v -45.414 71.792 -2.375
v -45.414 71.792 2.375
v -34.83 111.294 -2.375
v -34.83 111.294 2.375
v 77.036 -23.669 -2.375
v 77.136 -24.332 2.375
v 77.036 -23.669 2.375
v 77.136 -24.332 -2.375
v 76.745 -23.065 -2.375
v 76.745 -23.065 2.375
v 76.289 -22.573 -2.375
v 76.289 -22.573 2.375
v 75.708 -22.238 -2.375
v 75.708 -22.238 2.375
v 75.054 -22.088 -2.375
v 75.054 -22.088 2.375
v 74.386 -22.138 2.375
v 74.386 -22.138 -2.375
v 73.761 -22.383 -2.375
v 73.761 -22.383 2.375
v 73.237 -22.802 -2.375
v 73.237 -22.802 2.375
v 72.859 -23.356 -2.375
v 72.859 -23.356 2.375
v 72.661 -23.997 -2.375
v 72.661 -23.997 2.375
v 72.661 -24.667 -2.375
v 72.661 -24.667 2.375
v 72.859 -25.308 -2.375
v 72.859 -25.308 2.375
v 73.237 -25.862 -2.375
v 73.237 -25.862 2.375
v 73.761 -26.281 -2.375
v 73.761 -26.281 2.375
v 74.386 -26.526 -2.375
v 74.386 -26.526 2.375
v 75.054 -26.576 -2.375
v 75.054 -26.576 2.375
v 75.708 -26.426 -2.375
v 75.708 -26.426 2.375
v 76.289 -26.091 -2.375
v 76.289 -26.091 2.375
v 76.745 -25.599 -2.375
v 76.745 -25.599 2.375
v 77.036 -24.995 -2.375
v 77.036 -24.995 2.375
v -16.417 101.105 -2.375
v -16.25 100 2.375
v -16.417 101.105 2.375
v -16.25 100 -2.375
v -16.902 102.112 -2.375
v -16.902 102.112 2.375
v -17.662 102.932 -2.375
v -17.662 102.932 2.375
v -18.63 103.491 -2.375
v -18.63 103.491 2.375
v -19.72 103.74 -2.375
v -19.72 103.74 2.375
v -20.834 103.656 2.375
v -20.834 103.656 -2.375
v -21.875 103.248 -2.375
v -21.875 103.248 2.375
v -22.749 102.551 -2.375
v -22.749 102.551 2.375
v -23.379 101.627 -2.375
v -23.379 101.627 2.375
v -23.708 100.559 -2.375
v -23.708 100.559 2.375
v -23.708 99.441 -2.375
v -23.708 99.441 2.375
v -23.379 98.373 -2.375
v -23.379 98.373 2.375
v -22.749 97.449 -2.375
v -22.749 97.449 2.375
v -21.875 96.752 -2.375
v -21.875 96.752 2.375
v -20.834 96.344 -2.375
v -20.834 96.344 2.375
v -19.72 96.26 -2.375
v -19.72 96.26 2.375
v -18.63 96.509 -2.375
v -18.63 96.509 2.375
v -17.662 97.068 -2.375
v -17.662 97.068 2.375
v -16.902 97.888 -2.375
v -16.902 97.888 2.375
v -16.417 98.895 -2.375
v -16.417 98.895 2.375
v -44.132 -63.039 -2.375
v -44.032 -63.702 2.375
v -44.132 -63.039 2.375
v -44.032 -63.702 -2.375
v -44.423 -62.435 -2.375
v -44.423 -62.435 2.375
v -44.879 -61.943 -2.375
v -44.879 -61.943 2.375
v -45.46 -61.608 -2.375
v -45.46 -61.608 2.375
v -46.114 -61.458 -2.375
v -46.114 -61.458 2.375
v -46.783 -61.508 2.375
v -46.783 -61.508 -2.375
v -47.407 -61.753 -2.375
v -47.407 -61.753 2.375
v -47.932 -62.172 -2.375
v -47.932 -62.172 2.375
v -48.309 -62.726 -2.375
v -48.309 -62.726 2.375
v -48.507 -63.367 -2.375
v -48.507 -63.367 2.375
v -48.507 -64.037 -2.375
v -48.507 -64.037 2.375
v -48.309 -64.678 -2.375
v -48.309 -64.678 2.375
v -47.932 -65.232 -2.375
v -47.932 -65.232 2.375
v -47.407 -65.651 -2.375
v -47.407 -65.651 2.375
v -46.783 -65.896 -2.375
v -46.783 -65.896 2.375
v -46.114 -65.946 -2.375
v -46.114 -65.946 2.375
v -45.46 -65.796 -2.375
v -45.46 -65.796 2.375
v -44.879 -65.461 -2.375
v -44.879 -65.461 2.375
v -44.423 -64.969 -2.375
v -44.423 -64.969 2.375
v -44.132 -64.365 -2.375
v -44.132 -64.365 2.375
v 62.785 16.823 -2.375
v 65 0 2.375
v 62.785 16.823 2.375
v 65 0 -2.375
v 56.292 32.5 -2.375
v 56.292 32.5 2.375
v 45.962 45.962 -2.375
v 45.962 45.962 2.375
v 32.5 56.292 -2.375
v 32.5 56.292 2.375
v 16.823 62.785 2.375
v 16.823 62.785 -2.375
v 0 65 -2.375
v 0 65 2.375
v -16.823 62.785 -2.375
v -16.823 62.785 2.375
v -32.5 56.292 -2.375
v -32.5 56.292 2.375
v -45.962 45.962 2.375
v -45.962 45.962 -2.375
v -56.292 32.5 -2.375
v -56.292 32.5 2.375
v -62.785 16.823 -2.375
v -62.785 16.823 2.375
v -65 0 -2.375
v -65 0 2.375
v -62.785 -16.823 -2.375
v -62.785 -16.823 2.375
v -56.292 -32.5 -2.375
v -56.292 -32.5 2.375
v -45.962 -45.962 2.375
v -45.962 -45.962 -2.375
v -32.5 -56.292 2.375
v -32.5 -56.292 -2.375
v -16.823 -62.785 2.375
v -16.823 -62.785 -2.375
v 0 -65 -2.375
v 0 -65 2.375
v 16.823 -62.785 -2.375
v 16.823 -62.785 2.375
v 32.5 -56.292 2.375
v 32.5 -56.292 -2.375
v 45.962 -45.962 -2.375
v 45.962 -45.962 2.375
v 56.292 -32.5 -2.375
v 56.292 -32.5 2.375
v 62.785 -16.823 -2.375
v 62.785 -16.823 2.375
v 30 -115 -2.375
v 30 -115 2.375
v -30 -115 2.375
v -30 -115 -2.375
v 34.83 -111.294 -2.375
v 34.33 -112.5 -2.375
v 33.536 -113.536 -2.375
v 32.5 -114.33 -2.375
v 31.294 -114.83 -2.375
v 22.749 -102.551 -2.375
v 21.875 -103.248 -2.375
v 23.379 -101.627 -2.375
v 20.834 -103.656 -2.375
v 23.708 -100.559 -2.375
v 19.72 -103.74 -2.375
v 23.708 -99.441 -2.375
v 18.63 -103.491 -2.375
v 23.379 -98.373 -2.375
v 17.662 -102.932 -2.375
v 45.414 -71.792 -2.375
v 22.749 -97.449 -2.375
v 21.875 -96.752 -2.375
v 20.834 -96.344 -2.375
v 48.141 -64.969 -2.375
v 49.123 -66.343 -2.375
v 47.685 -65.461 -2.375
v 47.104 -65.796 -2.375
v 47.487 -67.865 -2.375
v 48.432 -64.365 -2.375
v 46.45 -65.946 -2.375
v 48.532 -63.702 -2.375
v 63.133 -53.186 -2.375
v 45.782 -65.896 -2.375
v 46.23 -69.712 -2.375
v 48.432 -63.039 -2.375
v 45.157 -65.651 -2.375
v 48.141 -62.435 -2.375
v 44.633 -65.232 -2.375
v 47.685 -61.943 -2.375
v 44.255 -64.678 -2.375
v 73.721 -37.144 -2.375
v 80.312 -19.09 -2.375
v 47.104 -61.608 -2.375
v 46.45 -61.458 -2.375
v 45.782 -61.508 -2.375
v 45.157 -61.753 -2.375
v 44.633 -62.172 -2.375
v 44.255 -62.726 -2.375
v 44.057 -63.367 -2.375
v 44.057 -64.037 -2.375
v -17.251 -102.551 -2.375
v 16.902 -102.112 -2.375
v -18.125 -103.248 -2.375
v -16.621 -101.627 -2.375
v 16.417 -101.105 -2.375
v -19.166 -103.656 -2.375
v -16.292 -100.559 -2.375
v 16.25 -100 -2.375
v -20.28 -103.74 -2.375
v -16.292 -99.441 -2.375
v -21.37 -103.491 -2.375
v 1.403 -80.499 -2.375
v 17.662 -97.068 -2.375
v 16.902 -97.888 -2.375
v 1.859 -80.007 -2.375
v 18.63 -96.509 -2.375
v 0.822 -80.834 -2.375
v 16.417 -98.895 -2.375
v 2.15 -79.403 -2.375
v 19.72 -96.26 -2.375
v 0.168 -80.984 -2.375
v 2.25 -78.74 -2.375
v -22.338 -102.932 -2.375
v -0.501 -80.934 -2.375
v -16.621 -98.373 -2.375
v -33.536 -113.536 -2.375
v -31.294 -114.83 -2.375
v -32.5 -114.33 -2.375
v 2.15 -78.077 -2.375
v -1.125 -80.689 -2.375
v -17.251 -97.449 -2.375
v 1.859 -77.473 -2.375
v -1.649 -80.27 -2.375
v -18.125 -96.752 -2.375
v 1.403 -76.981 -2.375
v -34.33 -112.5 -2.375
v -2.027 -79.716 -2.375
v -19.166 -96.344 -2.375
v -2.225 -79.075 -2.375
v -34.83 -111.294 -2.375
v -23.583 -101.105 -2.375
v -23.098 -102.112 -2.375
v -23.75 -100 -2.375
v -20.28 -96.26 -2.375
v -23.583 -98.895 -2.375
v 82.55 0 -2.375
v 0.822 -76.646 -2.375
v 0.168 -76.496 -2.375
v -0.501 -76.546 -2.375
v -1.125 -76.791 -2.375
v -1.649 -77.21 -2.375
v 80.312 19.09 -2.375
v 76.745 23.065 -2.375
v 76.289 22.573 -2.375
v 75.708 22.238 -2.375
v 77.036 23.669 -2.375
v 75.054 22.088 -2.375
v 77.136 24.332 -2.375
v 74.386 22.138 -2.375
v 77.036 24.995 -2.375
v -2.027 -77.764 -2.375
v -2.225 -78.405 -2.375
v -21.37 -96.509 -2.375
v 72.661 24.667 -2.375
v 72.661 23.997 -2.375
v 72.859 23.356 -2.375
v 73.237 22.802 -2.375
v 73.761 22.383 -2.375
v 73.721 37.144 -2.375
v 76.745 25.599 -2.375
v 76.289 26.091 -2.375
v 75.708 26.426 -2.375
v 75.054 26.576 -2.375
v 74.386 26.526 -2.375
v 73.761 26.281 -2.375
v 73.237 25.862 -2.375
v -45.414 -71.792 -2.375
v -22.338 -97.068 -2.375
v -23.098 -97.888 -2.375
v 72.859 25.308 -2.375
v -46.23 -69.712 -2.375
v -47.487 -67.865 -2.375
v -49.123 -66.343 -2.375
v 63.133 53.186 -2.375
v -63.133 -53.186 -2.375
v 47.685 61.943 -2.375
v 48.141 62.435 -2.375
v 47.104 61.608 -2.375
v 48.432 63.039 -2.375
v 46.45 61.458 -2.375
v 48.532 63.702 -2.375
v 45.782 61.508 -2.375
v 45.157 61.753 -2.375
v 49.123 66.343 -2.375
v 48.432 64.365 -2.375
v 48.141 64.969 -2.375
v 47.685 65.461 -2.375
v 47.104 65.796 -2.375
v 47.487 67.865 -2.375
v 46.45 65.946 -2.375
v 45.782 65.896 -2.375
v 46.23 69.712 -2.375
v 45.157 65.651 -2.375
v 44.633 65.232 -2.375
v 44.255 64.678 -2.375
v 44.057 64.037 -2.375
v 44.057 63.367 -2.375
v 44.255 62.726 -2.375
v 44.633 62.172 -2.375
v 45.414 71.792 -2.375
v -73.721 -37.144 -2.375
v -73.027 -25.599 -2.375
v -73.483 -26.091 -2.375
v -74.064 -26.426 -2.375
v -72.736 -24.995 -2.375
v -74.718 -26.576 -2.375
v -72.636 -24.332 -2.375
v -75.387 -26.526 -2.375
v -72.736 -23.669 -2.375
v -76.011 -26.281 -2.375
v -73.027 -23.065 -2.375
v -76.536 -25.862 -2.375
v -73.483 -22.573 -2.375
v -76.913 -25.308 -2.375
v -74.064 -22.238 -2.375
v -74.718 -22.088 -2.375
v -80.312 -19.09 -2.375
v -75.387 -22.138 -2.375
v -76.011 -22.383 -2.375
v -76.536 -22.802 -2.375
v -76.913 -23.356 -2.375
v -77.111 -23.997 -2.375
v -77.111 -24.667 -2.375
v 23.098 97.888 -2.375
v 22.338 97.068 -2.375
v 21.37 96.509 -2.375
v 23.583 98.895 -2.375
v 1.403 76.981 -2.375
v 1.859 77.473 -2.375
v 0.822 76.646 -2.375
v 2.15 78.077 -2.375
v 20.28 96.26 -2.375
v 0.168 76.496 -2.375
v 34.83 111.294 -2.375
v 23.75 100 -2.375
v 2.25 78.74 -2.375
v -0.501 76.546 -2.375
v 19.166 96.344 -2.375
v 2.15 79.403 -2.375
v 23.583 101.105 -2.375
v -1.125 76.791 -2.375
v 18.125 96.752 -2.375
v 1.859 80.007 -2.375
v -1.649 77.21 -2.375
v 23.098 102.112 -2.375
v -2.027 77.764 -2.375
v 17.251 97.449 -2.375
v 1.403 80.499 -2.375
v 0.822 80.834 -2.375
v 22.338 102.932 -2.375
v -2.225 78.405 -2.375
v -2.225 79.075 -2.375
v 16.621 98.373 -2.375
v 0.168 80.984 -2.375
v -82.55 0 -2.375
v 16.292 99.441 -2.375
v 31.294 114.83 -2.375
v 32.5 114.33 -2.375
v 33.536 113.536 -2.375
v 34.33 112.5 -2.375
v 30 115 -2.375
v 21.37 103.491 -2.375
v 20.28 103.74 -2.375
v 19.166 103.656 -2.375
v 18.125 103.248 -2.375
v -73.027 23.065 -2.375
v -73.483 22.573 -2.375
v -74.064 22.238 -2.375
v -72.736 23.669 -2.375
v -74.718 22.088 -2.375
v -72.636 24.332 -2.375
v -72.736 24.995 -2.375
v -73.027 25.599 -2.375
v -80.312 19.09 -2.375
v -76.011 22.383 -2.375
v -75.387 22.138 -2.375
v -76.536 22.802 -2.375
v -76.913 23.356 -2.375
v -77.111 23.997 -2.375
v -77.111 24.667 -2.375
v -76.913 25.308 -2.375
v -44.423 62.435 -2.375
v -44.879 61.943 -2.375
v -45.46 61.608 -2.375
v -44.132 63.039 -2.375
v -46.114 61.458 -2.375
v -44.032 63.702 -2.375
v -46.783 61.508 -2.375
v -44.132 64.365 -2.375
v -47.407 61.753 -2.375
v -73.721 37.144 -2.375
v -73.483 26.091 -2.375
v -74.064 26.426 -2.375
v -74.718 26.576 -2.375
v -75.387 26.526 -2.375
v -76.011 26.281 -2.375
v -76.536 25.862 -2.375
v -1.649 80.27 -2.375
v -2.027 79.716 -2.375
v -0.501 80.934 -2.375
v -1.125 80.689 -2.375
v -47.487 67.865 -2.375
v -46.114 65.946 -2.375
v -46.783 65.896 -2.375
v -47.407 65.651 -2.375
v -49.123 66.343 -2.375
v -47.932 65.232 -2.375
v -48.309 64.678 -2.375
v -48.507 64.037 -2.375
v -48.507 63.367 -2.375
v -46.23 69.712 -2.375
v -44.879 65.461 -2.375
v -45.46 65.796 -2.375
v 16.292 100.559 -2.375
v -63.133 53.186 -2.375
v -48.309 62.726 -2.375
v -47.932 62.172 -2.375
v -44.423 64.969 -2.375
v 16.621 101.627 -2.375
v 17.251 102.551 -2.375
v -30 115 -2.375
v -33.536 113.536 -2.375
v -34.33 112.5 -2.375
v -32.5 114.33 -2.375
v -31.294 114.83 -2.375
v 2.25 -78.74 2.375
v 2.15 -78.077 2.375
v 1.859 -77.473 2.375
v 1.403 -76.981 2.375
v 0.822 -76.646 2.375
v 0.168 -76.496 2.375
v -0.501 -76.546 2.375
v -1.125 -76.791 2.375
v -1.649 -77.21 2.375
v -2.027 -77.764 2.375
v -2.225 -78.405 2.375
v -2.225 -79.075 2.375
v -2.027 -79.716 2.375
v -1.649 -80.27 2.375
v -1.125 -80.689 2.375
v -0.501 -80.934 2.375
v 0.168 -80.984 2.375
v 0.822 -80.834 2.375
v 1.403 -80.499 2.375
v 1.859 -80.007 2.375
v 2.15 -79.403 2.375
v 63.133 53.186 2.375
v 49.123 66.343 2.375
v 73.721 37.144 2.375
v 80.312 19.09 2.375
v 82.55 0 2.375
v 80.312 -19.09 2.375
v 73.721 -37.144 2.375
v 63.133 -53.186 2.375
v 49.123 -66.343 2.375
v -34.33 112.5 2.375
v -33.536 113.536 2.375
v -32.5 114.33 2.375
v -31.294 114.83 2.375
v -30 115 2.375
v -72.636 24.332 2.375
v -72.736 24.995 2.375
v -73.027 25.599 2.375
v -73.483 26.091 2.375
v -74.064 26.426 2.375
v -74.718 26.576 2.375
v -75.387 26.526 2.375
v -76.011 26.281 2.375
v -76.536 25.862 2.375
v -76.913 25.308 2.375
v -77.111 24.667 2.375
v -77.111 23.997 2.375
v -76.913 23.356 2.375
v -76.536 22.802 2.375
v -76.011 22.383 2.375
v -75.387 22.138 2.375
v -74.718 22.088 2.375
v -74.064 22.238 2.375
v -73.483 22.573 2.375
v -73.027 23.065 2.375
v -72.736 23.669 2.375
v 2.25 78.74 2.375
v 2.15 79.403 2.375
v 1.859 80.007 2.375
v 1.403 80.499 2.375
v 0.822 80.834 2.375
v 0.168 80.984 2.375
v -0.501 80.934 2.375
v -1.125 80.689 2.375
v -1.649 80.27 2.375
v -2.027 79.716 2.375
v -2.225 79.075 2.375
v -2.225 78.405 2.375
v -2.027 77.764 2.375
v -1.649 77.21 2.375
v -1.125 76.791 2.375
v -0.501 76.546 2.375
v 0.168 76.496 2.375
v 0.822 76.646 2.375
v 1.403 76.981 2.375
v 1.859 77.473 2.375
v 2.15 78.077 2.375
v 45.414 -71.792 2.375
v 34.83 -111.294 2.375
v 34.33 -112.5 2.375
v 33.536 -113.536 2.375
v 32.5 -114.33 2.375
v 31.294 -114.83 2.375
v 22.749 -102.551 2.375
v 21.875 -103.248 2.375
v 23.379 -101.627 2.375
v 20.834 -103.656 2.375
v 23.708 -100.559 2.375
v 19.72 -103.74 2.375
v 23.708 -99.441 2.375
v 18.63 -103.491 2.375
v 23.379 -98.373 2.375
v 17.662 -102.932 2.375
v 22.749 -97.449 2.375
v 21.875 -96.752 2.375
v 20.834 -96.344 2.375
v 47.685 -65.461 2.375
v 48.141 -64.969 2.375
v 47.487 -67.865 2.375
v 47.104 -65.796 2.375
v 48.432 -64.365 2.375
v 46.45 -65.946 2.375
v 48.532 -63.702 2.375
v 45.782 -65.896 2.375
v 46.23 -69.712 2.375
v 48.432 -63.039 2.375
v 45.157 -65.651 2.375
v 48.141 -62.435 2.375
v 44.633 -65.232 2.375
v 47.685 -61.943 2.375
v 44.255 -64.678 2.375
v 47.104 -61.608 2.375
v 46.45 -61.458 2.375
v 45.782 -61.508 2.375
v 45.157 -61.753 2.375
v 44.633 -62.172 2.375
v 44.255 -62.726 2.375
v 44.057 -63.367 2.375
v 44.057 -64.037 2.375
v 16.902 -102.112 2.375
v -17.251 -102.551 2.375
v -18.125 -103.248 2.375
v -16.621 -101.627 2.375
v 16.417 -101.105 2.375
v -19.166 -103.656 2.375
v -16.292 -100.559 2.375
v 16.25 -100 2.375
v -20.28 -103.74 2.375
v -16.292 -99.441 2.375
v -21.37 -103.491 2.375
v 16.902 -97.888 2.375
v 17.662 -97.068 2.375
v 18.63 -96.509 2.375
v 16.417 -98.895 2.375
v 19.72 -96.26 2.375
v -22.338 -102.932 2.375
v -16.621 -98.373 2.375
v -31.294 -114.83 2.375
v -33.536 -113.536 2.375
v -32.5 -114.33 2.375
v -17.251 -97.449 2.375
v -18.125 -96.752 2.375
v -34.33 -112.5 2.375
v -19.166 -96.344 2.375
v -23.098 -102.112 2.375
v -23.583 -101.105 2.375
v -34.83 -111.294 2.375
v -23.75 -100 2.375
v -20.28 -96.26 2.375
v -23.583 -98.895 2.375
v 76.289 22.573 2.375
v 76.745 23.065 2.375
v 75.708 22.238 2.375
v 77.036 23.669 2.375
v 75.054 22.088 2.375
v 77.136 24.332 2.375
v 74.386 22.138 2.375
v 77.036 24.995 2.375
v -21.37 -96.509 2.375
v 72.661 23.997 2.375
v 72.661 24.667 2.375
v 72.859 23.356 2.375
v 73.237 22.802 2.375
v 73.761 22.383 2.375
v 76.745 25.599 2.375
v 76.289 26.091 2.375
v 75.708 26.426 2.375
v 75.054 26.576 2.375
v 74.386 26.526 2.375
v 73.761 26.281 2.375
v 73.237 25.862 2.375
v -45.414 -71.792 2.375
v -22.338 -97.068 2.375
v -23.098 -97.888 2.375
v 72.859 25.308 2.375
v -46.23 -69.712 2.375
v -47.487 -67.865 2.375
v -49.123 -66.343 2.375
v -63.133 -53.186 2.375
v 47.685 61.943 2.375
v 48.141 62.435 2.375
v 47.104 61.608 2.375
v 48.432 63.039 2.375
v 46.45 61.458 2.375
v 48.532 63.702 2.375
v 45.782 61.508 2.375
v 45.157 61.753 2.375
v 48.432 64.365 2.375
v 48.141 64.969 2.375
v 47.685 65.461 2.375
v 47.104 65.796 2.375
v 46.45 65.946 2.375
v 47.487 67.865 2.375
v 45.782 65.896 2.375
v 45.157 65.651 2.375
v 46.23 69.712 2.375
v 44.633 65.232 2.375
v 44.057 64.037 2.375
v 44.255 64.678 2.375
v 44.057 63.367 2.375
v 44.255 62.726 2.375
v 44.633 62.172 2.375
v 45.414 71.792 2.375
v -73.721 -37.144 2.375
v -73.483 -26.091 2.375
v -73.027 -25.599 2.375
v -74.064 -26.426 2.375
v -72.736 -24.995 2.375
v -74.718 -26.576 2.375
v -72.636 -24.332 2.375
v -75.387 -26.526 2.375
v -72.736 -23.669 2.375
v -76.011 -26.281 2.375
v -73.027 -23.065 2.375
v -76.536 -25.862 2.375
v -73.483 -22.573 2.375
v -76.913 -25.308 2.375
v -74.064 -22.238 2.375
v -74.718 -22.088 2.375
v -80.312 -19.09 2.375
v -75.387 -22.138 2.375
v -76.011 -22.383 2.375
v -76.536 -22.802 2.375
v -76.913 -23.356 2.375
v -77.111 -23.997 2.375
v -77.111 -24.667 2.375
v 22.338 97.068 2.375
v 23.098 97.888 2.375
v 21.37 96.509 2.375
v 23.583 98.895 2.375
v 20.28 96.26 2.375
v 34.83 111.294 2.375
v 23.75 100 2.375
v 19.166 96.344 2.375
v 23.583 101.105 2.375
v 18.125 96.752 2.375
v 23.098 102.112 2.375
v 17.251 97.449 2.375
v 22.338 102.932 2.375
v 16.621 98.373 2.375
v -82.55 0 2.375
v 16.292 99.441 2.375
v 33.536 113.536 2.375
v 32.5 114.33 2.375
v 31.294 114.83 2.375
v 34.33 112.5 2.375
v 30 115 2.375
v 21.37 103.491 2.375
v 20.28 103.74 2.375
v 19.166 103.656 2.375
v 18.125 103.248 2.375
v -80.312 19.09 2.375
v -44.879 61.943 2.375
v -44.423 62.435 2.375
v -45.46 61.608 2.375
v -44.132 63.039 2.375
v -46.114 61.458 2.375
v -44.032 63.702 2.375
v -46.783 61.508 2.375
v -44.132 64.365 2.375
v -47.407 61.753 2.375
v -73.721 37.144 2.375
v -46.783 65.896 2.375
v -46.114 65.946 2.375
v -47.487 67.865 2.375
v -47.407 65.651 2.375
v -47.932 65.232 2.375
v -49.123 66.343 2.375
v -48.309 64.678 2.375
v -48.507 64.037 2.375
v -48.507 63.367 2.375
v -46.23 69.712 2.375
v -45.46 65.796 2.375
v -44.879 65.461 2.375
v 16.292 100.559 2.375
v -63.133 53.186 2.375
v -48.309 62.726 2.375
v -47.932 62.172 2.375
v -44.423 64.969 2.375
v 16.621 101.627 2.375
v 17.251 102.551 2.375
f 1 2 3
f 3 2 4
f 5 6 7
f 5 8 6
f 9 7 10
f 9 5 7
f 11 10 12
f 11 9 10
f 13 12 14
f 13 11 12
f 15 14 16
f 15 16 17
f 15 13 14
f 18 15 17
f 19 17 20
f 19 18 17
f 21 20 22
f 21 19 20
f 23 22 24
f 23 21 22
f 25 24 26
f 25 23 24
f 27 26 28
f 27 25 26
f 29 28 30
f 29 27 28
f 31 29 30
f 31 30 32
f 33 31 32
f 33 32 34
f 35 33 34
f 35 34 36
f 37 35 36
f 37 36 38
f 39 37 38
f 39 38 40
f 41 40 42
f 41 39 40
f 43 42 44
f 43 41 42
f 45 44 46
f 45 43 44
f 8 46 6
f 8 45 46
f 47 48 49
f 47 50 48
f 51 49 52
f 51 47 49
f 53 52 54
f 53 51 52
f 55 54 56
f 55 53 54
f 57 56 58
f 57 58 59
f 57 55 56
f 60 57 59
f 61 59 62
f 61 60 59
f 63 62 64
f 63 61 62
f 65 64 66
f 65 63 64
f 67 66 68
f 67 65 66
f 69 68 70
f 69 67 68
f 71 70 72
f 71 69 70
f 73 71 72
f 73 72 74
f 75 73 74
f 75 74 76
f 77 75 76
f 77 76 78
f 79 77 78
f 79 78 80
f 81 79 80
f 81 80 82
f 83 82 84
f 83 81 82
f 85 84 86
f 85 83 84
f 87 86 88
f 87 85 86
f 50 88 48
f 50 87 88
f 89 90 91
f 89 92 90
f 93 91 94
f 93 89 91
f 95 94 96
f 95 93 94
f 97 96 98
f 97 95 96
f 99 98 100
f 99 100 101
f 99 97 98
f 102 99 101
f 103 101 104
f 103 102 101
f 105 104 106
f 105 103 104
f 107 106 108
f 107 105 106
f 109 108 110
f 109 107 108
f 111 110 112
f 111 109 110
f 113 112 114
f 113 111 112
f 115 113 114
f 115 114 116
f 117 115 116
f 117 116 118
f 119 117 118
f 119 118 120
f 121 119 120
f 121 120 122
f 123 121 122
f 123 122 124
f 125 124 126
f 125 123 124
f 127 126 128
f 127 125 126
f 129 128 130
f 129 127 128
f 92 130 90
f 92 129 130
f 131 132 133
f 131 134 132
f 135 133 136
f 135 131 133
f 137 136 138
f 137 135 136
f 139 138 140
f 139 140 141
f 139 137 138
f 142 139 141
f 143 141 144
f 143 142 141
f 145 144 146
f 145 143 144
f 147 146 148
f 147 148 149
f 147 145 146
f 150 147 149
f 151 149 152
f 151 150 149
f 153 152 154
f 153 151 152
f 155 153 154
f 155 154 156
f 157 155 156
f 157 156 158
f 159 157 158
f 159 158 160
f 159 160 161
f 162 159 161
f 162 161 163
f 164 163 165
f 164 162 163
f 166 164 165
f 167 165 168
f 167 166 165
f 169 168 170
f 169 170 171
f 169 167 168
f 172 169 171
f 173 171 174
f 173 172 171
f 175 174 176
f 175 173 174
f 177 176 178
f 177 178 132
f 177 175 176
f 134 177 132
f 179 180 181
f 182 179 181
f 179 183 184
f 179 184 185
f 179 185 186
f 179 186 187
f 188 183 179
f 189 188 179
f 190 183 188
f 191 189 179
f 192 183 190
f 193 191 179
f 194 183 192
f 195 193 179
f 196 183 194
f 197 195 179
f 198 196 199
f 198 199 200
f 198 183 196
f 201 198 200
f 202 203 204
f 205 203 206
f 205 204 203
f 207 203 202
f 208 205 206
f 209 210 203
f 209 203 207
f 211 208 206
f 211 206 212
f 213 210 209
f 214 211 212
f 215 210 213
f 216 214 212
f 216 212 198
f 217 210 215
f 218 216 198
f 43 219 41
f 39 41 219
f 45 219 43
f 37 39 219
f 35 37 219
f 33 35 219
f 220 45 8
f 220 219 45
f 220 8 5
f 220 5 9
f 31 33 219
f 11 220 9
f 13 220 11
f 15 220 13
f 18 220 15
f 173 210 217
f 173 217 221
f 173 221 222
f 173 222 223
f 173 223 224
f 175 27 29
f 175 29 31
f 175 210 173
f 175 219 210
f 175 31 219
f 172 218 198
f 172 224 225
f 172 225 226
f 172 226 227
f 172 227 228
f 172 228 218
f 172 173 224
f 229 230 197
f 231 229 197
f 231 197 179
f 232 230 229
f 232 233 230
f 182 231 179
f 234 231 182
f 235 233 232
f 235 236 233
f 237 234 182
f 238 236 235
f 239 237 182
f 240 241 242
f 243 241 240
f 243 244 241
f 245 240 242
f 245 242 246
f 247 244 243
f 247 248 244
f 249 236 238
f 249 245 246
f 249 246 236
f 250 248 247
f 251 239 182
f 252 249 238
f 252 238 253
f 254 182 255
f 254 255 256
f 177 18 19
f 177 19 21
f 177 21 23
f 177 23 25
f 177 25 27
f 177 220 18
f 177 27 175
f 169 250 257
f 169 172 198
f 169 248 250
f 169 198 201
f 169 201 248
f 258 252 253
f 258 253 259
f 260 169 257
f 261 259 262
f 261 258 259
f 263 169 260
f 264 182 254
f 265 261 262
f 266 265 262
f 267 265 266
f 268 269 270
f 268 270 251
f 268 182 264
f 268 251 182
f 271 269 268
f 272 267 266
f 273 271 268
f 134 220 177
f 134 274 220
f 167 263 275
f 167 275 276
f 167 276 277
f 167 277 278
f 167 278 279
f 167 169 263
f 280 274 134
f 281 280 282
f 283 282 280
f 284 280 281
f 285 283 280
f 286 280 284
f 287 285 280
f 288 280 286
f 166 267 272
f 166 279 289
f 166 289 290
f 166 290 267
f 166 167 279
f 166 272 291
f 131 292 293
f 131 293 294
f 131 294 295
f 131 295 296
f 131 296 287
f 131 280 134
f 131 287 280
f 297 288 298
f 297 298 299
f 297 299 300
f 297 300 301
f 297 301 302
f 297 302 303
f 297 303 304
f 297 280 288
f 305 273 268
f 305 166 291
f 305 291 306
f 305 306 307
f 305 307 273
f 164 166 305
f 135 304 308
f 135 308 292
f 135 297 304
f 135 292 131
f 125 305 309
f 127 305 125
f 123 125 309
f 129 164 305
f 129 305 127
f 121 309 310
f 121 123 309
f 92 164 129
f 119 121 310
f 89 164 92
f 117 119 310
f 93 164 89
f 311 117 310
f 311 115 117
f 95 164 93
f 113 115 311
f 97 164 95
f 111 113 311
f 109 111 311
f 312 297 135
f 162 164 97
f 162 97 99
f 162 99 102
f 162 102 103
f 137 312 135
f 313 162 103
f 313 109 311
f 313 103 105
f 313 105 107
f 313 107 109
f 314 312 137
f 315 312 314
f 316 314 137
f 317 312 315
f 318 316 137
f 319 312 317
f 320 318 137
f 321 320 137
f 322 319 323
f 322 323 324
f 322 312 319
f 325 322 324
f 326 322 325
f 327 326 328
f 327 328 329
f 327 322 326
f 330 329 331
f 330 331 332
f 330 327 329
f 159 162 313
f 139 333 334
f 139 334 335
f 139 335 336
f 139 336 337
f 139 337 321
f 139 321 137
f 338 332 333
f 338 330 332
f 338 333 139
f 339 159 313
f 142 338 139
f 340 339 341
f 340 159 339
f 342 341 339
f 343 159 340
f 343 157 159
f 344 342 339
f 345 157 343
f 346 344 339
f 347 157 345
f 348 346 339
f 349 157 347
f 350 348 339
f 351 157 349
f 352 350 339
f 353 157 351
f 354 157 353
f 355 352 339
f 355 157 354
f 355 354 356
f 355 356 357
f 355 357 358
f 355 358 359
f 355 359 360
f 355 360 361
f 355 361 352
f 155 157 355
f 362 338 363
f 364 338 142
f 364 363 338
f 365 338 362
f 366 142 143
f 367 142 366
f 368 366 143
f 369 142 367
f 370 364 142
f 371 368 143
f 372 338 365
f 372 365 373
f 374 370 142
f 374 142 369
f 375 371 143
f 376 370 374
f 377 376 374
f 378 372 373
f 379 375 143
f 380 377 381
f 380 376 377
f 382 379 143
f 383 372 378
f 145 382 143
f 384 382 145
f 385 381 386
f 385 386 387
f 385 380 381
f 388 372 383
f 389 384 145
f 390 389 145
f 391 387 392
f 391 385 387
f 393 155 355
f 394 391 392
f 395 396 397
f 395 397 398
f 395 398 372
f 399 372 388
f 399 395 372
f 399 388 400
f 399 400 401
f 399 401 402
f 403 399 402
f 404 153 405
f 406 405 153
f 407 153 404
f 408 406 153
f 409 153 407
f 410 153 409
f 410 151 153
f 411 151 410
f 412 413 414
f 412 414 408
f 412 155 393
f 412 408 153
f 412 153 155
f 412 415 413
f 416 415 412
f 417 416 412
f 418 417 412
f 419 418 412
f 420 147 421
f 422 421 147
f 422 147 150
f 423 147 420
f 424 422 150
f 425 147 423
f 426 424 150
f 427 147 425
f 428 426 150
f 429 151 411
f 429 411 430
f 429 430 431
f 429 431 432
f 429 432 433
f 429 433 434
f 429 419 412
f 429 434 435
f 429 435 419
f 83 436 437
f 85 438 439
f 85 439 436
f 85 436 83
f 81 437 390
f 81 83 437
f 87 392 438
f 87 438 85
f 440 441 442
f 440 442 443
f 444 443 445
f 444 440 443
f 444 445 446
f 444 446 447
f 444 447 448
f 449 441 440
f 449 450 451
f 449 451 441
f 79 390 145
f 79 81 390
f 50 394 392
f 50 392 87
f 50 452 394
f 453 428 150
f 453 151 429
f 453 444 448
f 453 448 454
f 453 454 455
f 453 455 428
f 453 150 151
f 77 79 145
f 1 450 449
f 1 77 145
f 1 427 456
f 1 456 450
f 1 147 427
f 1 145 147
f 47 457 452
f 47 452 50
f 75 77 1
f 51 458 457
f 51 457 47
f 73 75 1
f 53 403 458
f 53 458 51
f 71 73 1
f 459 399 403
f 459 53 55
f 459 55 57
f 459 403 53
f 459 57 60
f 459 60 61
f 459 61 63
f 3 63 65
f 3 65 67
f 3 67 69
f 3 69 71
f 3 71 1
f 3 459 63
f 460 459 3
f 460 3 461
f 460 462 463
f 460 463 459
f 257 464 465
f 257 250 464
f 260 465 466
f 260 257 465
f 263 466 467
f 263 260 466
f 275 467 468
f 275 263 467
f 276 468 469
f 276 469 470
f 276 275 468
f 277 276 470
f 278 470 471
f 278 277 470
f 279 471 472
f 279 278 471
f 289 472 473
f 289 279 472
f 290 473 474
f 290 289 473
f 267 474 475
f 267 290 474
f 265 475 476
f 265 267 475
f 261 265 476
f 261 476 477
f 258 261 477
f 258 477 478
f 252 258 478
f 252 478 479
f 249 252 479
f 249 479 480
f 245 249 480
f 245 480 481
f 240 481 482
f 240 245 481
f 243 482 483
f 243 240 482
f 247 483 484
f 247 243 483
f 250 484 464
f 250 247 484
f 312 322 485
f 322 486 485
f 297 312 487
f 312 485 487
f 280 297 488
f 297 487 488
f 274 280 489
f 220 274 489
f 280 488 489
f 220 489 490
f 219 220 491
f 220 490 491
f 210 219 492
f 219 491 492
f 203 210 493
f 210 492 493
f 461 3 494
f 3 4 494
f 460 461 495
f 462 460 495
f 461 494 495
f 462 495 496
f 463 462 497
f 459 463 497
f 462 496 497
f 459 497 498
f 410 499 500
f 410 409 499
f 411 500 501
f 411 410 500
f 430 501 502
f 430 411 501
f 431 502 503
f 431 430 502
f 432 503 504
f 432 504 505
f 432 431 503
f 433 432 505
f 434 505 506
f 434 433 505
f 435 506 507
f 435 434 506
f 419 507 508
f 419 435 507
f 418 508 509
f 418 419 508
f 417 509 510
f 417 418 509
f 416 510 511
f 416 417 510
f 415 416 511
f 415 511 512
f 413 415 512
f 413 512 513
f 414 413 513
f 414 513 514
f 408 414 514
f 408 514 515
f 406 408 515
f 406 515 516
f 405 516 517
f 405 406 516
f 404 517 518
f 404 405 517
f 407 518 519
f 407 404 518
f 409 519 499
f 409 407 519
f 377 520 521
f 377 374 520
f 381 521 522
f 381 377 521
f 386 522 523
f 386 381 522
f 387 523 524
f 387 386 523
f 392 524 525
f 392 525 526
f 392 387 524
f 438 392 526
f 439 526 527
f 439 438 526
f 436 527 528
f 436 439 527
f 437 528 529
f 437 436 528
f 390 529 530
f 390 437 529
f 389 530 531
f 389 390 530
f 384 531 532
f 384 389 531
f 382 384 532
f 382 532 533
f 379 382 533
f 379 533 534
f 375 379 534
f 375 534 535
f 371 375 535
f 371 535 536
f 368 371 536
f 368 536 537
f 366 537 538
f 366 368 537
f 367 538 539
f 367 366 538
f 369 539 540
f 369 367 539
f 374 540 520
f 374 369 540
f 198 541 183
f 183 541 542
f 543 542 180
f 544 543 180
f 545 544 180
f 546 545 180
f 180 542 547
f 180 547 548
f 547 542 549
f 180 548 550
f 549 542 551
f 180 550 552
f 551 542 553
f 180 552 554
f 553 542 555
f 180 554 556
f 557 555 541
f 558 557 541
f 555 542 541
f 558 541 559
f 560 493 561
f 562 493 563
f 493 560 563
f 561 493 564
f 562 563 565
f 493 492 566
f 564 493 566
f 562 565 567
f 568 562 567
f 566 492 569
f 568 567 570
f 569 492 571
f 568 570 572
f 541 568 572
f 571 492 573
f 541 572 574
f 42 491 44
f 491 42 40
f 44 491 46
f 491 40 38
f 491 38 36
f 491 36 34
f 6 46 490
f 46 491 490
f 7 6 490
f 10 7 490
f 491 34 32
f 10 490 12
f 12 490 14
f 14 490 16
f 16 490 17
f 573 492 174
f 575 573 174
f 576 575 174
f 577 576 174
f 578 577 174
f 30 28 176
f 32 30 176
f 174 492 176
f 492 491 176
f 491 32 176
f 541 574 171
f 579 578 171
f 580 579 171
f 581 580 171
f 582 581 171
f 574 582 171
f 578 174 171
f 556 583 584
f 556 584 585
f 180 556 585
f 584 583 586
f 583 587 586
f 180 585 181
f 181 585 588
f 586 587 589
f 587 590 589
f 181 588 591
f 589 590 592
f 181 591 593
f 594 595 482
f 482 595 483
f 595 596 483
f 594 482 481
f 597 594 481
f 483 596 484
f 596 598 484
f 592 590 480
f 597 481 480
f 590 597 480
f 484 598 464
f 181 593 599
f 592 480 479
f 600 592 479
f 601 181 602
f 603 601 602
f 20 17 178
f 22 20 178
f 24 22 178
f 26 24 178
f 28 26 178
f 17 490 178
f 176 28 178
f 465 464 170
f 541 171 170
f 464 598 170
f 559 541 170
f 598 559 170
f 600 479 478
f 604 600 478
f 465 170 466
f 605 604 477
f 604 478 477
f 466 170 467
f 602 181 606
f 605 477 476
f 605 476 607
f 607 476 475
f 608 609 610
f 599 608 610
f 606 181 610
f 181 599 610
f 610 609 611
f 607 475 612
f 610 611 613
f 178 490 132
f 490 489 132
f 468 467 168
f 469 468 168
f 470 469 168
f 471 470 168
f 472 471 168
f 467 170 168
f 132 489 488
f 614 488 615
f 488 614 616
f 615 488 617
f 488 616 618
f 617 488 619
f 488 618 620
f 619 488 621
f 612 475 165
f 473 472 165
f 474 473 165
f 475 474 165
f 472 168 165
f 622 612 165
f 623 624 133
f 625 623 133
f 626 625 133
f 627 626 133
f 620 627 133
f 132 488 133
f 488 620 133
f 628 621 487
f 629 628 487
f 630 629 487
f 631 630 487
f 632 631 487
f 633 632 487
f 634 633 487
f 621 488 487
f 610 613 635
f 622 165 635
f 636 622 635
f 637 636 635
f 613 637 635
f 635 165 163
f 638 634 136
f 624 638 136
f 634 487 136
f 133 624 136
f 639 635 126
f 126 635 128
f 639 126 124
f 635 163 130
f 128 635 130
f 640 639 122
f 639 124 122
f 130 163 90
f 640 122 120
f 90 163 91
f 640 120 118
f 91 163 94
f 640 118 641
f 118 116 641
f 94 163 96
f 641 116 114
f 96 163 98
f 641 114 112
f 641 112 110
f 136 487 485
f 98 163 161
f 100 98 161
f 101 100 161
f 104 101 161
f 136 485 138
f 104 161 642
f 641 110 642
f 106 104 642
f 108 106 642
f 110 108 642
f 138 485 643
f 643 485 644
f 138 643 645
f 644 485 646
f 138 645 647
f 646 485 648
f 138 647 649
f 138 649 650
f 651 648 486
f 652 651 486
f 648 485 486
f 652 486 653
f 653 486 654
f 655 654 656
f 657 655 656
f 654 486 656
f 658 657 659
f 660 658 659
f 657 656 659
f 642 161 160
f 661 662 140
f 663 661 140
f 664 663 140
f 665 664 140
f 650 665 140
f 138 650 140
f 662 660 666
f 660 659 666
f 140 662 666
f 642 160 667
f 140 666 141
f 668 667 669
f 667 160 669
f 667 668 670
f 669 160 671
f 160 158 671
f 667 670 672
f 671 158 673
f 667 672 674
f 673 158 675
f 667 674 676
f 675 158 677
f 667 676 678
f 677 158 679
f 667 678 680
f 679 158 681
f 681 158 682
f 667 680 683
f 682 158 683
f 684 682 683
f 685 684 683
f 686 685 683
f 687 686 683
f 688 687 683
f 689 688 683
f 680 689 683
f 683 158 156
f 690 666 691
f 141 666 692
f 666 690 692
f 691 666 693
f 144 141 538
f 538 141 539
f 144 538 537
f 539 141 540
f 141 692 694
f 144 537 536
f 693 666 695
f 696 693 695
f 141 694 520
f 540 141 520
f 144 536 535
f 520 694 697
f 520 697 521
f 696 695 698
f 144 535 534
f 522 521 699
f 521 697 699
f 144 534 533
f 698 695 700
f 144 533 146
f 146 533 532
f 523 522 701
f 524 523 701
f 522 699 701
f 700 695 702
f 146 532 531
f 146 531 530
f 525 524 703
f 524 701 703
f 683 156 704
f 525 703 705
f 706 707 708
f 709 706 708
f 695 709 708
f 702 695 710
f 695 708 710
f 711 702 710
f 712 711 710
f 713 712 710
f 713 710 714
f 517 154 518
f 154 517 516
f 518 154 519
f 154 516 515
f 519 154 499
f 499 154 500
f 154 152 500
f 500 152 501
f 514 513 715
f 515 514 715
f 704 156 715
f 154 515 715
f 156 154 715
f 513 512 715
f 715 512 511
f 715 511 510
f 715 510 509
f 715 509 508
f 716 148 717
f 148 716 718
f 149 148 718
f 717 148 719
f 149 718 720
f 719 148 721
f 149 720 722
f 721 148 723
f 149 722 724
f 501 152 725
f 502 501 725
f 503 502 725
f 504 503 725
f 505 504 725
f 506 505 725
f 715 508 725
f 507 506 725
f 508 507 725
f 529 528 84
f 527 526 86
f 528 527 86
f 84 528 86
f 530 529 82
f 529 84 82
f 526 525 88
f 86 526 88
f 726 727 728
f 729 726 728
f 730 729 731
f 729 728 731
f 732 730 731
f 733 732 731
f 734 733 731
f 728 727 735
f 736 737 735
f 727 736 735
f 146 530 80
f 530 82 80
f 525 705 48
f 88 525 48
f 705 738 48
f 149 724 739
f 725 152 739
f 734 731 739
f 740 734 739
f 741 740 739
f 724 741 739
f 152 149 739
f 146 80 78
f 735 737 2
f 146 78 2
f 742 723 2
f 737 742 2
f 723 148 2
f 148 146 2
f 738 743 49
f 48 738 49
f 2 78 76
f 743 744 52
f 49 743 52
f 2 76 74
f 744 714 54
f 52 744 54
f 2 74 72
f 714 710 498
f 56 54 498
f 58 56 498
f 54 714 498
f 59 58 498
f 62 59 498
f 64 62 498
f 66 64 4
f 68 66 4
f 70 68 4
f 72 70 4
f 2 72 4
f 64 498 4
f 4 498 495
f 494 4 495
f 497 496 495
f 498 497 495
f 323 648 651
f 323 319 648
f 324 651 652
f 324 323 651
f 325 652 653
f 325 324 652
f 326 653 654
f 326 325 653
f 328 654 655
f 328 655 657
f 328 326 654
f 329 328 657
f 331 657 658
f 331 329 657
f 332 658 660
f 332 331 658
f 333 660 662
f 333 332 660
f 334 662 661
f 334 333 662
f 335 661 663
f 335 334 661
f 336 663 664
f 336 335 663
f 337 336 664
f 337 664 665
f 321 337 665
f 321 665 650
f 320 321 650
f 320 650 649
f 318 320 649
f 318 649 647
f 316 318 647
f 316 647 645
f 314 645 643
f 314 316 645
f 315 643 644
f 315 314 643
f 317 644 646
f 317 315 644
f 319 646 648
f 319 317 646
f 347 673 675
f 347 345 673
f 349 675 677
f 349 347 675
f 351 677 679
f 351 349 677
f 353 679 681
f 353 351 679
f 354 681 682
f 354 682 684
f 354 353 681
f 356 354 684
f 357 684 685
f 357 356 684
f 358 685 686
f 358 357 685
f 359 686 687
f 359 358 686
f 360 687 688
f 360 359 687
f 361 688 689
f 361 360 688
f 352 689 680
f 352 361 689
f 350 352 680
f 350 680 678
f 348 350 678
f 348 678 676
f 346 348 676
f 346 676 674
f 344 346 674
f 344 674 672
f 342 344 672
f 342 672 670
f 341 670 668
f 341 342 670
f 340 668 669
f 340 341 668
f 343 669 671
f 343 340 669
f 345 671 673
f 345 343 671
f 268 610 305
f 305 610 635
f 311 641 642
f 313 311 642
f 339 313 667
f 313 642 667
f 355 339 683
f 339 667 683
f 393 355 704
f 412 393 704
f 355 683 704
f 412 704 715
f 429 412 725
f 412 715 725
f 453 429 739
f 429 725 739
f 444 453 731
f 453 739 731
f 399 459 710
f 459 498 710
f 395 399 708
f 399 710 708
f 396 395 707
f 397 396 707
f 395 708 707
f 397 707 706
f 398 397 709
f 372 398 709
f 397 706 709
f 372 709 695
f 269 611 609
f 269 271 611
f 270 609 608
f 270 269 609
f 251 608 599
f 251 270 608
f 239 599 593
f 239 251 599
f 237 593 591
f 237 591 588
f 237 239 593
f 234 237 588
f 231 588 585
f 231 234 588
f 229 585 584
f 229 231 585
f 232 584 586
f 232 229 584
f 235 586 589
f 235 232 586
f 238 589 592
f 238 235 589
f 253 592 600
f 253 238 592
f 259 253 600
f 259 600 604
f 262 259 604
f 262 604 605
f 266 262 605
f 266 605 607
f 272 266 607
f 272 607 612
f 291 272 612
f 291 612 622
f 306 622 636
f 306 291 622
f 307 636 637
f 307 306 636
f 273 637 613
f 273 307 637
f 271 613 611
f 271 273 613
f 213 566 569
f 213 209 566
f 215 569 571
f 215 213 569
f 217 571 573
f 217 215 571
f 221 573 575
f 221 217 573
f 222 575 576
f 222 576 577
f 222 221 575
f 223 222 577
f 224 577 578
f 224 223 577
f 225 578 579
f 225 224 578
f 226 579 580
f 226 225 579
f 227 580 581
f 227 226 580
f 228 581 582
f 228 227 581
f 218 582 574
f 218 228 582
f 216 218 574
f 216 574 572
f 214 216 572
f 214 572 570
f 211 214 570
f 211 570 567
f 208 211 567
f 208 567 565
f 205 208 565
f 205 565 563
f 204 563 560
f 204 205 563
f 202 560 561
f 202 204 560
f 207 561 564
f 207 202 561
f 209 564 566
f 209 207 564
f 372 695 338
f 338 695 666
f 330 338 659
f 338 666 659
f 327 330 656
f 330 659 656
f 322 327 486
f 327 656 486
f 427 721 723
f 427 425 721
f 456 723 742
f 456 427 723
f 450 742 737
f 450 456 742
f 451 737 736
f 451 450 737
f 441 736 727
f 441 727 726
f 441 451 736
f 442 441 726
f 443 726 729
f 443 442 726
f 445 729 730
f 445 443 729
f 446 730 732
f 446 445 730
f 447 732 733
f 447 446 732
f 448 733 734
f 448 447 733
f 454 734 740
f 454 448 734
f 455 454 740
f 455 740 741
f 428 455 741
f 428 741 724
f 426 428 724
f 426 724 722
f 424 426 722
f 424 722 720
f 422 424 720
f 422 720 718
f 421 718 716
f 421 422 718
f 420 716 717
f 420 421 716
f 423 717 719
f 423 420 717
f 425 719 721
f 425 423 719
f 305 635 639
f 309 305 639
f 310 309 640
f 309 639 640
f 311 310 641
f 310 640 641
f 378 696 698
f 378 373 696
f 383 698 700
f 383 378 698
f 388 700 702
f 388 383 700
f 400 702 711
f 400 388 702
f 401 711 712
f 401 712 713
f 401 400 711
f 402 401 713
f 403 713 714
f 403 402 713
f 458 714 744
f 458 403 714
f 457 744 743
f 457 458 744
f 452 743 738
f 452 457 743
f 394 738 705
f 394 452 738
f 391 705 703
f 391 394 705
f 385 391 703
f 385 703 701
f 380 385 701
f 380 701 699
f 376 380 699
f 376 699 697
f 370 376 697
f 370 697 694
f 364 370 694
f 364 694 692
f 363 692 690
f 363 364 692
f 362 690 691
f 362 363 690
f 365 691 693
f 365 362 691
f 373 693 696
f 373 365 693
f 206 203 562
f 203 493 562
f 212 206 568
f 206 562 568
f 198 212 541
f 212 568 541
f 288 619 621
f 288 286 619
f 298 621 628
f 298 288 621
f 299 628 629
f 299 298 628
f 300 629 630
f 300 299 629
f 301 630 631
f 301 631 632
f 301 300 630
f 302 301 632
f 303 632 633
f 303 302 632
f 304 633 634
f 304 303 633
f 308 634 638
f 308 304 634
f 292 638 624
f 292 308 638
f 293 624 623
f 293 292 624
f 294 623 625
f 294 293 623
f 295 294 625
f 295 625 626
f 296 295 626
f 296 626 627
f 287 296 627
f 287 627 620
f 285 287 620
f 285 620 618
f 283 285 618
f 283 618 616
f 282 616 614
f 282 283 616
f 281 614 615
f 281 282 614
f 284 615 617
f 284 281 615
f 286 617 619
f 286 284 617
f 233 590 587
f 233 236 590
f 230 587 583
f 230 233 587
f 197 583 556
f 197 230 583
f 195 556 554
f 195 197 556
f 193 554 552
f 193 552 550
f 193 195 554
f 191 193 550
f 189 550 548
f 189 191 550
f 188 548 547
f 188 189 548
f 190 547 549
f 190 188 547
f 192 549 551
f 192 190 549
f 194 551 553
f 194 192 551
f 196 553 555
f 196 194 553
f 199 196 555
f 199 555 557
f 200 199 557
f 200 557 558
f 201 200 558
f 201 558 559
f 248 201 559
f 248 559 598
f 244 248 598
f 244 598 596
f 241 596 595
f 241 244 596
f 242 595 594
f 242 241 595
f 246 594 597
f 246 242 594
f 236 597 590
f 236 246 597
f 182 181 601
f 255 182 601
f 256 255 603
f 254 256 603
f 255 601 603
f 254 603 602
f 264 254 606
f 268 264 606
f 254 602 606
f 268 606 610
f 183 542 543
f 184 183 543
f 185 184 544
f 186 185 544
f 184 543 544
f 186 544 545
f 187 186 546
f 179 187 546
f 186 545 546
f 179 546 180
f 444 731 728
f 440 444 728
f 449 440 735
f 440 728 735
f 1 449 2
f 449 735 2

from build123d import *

# Parameters (mm, degrees)
SKETCH1_R           = 65
SKETCH1_R_2         = 3.75
SKETCH1_R_3         = 2.25
BOSS_EXTRUDE1_DEPTH = 2.3749


with BuildPart() as part:
    # Sketch1 → Boss-Extrude1 (new, symmetric)
    with BuildSketch(Plane.XY):
        with BuildLine():
            Line((-45.414170693, 71.792048343), (-34.829629131, 111.294095226))
            ThreePointArc((-34.829629131, 111.294095226), (-33.043807145, 113.966766701), (-30, 115))
            Line((-30, 115), (30, 115))
            ThreePointArc((30, 115), (33.043807145, 113.966766701), (34.829629131, 111.294095226))
            Line((34.829629131, 111.294095226), (45.414170693, 71.792048343))
            ThreePointArc((45.414170693, 71.792048343), (46.806677386, 68.753444104), (49.122761322, 66.343476093))
            ThreePointArc((49.122761322, 66.343476093), (82.55, 0), (49.122761322, -66.343476093))
            ThreePointArc((49.122761322, -66.343476093), (46.806677386, -68.753444104), (45.414170693, -71.792048343))
            Line((45.414170693, -71.792048343), (34.829629131, -111.294095226))
            ThreePointArc((34.829629131, -111.294095226), (33.043807145, -113.966766701), (30, -115))
            Line((30, -115), (-30, -115))
            ThreePointArc((-30, -115), (-33.043807145, -113.966766701), (-34.829629131, -111.294095226))
            Line((-34.829629131, -111.294095226), (-45.414170693, -71.792048343))
            ThreePointArc((-45.414170693, -71.792048343), (-46.806677386, -68.753444104), (-49.122761322, -66.343476093))
            ThreePointArc((-49.122761322, -66.343476093), (-82.55, 0), (-49.122761322, 66.343476093))
            ThreePointArc((-49.122761322, 66.343476093), (-46.806677386, 68.753444104), (-45.414170693, 71.792048343))
        make_face()
        Circle(SKETCH1_R, mode=Mode.SUBTRACT)
        with Locations((-20, 100)):
            Circle(SKETCH1_R_2, mode=Mode.SUBTRACT)
        with Locations((20, 100)):
            Circle(SKETCH1_R_2, mode=Mode.SUBTRACT)
        with Locations(Location((20, -100, 0), (0, 0, 180))):
            Circle(SKETCH1_R_2, mode=Mode.SUBTRACT)
        with Locations(Location((-20, -100, 0), (0, 0, 180))):
            Circle(SKETCH1_R_2, mode=Mode.SUBTRACT)
        with Locations((0, 78.74)):
            Circle(SKETCH1_R_3, mode=Mode.SUBTRACT)
        with Locations((46.282210766, 63.701998137)):
            Circle(SKETCH1_R_3, mode=Mode.SUBTRACT)
        with Locations((74.886190093, 24.331998137)):
            Circle(SKETCH1_R_3, mode=Mode.SUBTRACT)
        with Locations((74.886190093, -24.331998137)):
            Circle(SKETCH1_R_3, mode=Mode.SUBTRACT)
        with Locations((46.282210766, -63.701998137)):
            Circle(SKETCH1_R_3, mode=Mode.SUBTRACT)
        with Locations((0, -78.74)):
            Circle(SKETCH1_R_3, mode=Mode.SUBTRACT)
        with Locations((-46.282210766, -63.701998137)):
            Circle(SKETCH1_R_3, mode=Mode.SUBTRACT)
        with Locations((-74.886190093, -24.331998137)):
            Circle(SKETCH1_R_3, mode=Mode.SUBTRACT)
        with Locations((-74.886190093, 24.331998137)):
            Circle(SKETCH1_R_3, mode=Mode.SUBTRACT)
        with Locations((-46.282210766, 63.701998137)):
            Circle(SKETCH1_R_3, mode=Mode.SUBTRACT)
    extrude(amount=BOSS_EXTRUDE1_DEPTH, both=True)


solid = part.part
